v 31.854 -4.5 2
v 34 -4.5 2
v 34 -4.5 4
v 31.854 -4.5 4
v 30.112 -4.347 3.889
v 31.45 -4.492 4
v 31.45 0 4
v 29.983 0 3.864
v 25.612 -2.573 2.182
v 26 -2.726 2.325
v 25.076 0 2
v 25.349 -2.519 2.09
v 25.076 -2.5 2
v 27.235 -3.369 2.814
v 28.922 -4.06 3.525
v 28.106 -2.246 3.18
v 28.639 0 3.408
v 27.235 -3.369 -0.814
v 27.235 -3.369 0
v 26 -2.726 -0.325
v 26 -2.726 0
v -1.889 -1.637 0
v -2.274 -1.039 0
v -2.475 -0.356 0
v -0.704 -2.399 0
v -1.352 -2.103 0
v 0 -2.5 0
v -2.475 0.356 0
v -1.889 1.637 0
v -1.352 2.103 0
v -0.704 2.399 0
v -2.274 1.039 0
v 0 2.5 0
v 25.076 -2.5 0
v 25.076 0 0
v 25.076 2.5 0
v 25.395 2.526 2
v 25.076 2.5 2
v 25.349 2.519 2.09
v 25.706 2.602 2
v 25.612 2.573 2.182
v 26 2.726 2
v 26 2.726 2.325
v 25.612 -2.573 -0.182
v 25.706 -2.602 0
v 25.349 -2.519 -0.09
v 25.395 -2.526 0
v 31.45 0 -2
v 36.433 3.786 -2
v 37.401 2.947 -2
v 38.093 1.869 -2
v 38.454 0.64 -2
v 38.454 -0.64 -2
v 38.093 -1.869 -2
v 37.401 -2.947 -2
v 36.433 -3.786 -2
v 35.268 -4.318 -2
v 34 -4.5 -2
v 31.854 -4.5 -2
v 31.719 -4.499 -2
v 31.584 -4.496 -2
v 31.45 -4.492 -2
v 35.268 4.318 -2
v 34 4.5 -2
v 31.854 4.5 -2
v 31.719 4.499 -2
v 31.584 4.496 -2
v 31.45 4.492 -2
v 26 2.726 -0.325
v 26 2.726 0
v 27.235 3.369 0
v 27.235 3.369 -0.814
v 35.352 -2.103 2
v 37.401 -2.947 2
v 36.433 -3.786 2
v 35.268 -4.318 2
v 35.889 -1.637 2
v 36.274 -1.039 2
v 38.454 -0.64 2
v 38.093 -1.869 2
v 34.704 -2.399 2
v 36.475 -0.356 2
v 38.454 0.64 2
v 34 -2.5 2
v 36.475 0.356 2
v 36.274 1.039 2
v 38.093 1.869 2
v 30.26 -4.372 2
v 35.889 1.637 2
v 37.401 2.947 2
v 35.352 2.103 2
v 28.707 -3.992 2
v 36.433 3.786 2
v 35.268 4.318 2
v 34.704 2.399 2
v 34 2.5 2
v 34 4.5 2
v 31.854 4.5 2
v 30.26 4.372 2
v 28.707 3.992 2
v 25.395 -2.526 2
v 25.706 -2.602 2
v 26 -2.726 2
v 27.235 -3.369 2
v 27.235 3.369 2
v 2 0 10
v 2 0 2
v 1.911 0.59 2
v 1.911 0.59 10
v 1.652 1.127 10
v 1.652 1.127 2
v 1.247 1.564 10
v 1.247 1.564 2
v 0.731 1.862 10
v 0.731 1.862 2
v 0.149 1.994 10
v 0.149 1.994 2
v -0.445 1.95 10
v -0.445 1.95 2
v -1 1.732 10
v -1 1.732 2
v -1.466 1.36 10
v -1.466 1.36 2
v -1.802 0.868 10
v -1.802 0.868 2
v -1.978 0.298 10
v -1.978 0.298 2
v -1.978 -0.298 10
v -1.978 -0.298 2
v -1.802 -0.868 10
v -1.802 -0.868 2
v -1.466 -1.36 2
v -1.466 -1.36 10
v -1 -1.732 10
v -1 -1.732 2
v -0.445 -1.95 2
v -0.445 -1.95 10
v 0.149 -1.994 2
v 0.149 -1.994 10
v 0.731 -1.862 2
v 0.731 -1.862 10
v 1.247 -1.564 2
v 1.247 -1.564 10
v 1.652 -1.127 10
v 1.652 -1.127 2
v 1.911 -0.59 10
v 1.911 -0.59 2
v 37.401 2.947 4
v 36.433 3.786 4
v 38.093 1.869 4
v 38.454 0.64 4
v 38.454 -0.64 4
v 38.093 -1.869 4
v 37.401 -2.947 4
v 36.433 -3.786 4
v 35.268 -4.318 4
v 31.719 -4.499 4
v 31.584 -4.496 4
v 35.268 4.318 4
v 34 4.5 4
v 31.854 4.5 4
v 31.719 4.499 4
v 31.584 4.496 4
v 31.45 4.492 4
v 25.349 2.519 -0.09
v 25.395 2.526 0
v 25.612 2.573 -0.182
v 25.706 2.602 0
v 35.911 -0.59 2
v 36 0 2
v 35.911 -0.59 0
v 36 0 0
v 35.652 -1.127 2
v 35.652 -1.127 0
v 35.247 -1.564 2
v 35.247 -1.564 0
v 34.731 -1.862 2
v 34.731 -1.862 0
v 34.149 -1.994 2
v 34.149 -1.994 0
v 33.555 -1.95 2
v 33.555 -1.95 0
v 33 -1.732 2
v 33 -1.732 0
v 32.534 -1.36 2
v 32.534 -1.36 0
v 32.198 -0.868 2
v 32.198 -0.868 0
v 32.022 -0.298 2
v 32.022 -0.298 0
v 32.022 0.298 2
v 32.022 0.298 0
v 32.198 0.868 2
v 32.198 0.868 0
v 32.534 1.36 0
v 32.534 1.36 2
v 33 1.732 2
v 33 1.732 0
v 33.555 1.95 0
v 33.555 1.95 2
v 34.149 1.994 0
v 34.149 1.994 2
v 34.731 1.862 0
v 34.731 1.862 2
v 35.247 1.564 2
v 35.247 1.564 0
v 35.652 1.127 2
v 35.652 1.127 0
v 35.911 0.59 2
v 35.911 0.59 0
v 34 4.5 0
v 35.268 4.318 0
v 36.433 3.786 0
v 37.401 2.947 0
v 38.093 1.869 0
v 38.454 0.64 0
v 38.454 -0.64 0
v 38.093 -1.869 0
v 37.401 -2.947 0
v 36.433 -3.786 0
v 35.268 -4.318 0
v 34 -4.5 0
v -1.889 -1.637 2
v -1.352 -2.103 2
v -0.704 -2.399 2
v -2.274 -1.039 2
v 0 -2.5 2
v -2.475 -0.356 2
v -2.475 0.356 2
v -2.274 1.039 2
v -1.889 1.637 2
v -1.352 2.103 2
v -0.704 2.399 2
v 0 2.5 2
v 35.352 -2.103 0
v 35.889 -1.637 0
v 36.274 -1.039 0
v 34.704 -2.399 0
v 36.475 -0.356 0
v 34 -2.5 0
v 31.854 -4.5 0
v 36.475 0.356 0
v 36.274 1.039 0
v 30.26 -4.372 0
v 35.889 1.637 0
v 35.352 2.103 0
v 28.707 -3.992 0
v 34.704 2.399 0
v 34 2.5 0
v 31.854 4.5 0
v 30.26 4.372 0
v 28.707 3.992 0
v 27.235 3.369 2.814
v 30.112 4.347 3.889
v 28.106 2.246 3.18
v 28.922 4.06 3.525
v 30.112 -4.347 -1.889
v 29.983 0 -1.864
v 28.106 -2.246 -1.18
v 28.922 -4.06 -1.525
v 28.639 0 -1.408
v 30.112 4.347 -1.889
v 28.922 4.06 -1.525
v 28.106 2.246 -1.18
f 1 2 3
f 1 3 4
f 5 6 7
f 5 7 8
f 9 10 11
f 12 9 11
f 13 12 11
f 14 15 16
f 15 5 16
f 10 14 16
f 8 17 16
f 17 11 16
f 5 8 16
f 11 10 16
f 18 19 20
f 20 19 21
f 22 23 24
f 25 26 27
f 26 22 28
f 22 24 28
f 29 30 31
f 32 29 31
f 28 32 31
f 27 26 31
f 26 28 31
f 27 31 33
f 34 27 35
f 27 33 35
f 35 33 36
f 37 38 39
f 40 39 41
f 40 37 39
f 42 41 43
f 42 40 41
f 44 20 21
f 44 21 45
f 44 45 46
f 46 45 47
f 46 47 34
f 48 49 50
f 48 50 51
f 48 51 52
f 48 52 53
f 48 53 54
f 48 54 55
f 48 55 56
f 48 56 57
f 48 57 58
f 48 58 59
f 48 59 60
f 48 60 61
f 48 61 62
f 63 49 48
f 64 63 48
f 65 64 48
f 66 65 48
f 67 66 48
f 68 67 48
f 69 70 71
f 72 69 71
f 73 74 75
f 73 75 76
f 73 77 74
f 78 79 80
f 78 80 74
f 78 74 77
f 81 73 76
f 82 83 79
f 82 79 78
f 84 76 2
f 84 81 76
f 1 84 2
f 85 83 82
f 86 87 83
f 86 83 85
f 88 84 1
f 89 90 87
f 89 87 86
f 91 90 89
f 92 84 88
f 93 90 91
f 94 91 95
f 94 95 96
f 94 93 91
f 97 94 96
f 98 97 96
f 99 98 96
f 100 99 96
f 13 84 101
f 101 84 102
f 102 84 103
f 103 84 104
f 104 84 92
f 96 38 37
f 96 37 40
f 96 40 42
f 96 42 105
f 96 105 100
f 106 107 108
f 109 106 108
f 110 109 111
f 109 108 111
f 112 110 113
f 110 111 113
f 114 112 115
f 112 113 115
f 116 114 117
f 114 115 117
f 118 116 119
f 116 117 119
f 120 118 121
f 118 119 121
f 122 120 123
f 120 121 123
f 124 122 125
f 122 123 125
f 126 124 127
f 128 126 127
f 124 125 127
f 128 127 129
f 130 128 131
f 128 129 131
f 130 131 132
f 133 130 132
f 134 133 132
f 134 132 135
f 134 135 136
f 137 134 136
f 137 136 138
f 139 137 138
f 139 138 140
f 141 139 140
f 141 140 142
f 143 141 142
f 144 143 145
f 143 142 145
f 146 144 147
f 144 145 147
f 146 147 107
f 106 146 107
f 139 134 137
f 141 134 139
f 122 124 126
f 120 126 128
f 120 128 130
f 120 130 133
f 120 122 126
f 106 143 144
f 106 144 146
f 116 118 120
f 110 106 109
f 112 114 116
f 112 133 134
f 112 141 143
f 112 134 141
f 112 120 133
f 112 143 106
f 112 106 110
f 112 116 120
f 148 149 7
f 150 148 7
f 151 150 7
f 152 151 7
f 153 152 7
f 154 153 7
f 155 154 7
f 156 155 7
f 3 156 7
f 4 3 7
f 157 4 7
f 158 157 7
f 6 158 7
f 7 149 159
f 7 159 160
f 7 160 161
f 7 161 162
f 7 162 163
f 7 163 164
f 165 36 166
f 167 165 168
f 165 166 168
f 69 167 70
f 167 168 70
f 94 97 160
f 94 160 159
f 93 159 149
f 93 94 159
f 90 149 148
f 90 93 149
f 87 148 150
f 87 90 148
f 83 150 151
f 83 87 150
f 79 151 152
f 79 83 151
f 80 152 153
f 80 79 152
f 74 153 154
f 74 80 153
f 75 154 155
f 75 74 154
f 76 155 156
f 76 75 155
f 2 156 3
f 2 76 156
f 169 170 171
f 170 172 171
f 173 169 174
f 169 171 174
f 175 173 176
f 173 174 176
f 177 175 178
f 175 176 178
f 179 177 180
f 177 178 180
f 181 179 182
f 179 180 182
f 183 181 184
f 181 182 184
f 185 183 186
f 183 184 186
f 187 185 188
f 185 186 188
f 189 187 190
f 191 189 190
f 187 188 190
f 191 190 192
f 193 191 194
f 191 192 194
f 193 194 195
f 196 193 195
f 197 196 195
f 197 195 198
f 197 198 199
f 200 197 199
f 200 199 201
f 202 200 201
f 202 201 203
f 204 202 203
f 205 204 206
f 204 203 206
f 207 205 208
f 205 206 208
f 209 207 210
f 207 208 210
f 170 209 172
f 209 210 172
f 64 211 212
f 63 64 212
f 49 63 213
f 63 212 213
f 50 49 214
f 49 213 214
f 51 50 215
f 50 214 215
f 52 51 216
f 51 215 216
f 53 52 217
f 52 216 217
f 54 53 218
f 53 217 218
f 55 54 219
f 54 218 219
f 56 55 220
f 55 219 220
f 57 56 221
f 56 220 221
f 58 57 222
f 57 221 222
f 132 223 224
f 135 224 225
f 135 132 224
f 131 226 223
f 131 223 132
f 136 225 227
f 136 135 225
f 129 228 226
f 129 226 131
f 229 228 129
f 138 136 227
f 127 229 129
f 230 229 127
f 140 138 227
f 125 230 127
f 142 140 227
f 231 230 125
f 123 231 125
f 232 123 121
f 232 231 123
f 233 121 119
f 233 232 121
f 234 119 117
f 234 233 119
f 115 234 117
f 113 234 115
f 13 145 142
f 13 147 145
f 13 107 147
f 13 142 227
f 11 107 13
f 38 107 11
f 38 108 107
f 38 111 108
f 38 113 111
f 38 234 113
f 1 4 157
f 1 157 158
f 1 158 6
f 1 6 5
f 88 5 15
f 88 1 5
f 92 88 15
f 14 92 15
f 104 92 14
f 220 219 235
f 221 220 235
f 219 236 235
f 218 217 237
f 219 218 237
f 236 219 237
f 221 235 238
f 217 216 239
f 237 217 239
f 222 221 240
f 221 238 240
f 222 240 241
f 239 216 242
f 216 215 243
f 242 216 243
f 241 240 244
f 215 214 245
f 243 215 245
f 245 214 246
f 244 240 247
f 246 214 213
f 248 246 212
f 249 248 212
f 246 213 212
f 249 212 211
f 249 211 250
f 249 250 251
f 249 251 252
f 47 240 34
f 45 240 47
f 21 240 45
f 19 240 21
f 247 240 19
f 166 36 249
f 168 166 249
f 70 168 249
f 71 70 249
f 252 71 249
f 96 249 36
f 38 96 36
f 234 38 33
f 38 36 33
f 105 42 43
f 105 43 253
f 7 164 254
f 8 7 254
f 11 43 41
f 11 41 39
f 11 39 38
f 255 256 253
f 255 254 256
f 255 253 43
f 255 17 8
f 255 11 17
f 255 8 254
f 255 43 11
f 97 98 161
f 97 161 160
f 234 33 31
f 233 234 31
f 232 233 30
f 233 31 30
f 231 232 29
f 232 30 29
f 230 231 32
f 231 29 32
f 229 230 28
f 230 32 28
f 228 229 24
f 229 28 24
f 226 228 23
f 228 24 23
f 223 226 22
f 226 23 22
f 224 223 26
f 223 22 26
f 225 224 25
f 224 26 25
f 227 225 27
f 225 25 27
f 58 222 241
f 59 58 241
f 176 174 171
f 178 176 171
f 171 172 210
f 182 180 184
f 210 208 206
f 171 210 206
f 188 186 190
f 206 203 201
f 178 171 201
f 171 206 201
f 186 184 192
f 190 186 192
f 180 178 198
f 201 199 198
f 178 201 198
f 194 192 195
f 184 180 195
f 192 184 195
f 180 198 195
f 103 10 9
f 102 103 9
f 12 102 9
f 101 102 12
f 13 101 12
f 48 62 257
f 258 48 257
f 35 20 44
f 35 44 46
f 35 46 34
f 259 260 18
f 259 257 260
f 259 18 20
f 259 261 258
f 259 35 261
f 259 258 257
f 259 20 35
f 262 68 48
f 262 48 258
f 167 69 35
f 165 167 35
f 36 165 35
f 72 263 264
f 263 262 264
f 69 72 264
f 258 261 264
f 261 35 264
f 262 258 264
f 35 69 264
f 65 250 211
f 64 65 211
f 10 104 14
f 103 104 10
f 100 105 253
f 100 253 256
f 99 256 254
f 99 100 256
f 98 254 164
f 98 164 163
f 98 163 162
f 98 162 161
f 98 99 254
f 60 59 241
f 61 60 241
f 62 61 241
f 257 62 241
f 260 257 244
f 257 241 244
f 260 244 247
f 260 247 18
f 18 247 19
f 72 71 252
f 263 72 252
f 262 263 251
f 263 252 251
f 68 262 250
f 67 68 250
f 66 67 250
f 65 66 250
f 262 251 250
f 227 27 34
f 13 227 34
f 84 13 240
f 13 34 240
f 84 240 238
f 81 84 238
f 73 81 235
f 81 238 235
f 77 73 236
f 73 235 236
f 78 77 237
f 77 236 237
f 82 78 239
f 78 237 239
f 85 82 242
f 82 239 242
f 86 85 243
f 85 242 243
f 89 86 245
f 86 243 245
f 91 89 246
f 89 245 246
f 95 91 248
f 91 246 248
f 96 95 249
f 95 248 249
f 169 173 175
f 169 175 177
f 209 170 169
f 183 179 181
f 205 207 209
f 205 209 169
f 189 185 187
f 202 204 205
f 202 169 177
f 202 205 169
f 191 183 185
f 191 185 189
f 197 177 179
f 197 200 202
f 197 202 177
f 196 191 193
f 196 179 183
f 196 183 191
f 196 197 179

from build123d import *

# Parameters (mm, degrees)
BOSS_EXTRUDE1_DEPTH = 2
SKETCH2_R           = 2
BOSS_EXTRUDE2_DEPTH = 8
SKETCH5_R           = 2
CUT_EXTRUDE2_DEPTH  = 4
BOSS_EXTRUDE3_DEPTH = 2
CUT_EXTRUDE1_DEPTH  = 5.5


with BuildPart() as part:
    # Sketch1 → Boss-Extrude1 (new body)
    with BuildSketch(Plane.XY):
        with BuildLine():
            Line((0, -2.5), (34, -2.5))
            ThreePointArc((34, -2.5), (36.5, 0), (34, 2.5))
            Line((34, 2.5), (0, 2.5))
            ThreePointArc((0, 2.5), (-2.5, 0), (0, -2.5))
        make_face()
    extrude(amount=BOSS_EXTRUDE1_DEPTH)

    # Sketch2 → Boss-Extrude2 (add)
    with BuildSketch(Plane.XY.offset(2)):
        Circle(SKETCH2_R)
    extrude(amount=BOSS_EXTRUDE2_DEPTH)

    # Sketch5 → Cut-Extrude2 (cut, symmetric)
    with BuildSketch(Plane(origin=(0, 0, 0), x_dir=(-1, 0, 0), z_dir=(0, 0, -1))):
        with Locations(Location((-34, 0, 0), (0, 0, 180))):
            Circle(SKETCH5_R)
    extrude(amount=CUT_EXTRUDE2_DEPTH, both=True, mode=Mode.SUBTRACT)

    # Sketch3 → Boss-Extrude3 (add)
    with BuildSketch(Plane(origin=(0, 0, 0), x_dir=(-1, 0, 0), z_dir=(0, 0, -1))):
        with BuildLine():
            Line((-34, -4.5), (-31.853983948, -4.5))
            ThreePointArc((-31.853983948, -4.5), (-29.476132044, -4.213177664), (-27.234684348, -3.369164065))
            Line((-27.234684348, -3.369164065), (-26.000115193, -2.726167187))
            ThreePointArc((-26.000115193, -2.726167187), (-25.551825654, -2.557364467), (-25.076255273, -2.5))
            Line((-25.076255273, -2.5), (-25.076255273, 2.5))
            ThreePointArc((-25.076255273, 2.5), (-25.551825654, 2.557364467), (-26.000115193, 2.726167187))
            Line((-26.000115193, 2.726167187), (-27.234684348, 3.369164065))
            ThreePointArc((-27.234684348, 3.369164065), (-29.476132044, 4.213177664), (-31.853983948, 4.5))
            Line((-31.853983948, 4.5), (-34, 4.5))
            ThreePointArc((-34, 4.5), (-38.5, 0), (-34, -4.5))
        make_face()
    boss_extrude3 = extrude(amount=BOSS_EXTRUDE3_DEPTH)

    # Sketch4 → Cut-Extrude1 (cut, symmetric)
    with BuildSketch(Plane(origin=(0, 0, 0), x_dir=(1, 0, 0), z_dir=(0, 1, 0))):
        with BuildLine():
            Line((31.853983948, 2), (31.853983948, 3.174344261))
            Line((31.853983948, 3.174344261), (24.383890118, 3.174344261))
            Line((24.383890118, 3.174344261), (25.076255273, 0))
            add(Edge.make_bspline(
                [(31.853983948, 2), (29.962456018, 2.02071595), (29.16990367, 1.605069608), (25.966821868, 0.283607958), (25.076255273, 0)],
                knots=[0, 0, 0, 0, 0.608348739, 1, 1, 1, 1], degree=3))
        make_face()
    cut_extrude1 = extrude(amount=CUT_EXTRUDE1_DEPTH, both=True, mode=Mode.SUBTRACT)

    # Mirror1: Boss-Extrude3, Cut-Extrude1 across plane
    add(boss_extrude3.mirror(Plane.XY.offset(1)))
    add(cut_extrude1.mirror(Plane.XY.offset(1)), mode=Mode.SUBTRACT)


solid = part.part
